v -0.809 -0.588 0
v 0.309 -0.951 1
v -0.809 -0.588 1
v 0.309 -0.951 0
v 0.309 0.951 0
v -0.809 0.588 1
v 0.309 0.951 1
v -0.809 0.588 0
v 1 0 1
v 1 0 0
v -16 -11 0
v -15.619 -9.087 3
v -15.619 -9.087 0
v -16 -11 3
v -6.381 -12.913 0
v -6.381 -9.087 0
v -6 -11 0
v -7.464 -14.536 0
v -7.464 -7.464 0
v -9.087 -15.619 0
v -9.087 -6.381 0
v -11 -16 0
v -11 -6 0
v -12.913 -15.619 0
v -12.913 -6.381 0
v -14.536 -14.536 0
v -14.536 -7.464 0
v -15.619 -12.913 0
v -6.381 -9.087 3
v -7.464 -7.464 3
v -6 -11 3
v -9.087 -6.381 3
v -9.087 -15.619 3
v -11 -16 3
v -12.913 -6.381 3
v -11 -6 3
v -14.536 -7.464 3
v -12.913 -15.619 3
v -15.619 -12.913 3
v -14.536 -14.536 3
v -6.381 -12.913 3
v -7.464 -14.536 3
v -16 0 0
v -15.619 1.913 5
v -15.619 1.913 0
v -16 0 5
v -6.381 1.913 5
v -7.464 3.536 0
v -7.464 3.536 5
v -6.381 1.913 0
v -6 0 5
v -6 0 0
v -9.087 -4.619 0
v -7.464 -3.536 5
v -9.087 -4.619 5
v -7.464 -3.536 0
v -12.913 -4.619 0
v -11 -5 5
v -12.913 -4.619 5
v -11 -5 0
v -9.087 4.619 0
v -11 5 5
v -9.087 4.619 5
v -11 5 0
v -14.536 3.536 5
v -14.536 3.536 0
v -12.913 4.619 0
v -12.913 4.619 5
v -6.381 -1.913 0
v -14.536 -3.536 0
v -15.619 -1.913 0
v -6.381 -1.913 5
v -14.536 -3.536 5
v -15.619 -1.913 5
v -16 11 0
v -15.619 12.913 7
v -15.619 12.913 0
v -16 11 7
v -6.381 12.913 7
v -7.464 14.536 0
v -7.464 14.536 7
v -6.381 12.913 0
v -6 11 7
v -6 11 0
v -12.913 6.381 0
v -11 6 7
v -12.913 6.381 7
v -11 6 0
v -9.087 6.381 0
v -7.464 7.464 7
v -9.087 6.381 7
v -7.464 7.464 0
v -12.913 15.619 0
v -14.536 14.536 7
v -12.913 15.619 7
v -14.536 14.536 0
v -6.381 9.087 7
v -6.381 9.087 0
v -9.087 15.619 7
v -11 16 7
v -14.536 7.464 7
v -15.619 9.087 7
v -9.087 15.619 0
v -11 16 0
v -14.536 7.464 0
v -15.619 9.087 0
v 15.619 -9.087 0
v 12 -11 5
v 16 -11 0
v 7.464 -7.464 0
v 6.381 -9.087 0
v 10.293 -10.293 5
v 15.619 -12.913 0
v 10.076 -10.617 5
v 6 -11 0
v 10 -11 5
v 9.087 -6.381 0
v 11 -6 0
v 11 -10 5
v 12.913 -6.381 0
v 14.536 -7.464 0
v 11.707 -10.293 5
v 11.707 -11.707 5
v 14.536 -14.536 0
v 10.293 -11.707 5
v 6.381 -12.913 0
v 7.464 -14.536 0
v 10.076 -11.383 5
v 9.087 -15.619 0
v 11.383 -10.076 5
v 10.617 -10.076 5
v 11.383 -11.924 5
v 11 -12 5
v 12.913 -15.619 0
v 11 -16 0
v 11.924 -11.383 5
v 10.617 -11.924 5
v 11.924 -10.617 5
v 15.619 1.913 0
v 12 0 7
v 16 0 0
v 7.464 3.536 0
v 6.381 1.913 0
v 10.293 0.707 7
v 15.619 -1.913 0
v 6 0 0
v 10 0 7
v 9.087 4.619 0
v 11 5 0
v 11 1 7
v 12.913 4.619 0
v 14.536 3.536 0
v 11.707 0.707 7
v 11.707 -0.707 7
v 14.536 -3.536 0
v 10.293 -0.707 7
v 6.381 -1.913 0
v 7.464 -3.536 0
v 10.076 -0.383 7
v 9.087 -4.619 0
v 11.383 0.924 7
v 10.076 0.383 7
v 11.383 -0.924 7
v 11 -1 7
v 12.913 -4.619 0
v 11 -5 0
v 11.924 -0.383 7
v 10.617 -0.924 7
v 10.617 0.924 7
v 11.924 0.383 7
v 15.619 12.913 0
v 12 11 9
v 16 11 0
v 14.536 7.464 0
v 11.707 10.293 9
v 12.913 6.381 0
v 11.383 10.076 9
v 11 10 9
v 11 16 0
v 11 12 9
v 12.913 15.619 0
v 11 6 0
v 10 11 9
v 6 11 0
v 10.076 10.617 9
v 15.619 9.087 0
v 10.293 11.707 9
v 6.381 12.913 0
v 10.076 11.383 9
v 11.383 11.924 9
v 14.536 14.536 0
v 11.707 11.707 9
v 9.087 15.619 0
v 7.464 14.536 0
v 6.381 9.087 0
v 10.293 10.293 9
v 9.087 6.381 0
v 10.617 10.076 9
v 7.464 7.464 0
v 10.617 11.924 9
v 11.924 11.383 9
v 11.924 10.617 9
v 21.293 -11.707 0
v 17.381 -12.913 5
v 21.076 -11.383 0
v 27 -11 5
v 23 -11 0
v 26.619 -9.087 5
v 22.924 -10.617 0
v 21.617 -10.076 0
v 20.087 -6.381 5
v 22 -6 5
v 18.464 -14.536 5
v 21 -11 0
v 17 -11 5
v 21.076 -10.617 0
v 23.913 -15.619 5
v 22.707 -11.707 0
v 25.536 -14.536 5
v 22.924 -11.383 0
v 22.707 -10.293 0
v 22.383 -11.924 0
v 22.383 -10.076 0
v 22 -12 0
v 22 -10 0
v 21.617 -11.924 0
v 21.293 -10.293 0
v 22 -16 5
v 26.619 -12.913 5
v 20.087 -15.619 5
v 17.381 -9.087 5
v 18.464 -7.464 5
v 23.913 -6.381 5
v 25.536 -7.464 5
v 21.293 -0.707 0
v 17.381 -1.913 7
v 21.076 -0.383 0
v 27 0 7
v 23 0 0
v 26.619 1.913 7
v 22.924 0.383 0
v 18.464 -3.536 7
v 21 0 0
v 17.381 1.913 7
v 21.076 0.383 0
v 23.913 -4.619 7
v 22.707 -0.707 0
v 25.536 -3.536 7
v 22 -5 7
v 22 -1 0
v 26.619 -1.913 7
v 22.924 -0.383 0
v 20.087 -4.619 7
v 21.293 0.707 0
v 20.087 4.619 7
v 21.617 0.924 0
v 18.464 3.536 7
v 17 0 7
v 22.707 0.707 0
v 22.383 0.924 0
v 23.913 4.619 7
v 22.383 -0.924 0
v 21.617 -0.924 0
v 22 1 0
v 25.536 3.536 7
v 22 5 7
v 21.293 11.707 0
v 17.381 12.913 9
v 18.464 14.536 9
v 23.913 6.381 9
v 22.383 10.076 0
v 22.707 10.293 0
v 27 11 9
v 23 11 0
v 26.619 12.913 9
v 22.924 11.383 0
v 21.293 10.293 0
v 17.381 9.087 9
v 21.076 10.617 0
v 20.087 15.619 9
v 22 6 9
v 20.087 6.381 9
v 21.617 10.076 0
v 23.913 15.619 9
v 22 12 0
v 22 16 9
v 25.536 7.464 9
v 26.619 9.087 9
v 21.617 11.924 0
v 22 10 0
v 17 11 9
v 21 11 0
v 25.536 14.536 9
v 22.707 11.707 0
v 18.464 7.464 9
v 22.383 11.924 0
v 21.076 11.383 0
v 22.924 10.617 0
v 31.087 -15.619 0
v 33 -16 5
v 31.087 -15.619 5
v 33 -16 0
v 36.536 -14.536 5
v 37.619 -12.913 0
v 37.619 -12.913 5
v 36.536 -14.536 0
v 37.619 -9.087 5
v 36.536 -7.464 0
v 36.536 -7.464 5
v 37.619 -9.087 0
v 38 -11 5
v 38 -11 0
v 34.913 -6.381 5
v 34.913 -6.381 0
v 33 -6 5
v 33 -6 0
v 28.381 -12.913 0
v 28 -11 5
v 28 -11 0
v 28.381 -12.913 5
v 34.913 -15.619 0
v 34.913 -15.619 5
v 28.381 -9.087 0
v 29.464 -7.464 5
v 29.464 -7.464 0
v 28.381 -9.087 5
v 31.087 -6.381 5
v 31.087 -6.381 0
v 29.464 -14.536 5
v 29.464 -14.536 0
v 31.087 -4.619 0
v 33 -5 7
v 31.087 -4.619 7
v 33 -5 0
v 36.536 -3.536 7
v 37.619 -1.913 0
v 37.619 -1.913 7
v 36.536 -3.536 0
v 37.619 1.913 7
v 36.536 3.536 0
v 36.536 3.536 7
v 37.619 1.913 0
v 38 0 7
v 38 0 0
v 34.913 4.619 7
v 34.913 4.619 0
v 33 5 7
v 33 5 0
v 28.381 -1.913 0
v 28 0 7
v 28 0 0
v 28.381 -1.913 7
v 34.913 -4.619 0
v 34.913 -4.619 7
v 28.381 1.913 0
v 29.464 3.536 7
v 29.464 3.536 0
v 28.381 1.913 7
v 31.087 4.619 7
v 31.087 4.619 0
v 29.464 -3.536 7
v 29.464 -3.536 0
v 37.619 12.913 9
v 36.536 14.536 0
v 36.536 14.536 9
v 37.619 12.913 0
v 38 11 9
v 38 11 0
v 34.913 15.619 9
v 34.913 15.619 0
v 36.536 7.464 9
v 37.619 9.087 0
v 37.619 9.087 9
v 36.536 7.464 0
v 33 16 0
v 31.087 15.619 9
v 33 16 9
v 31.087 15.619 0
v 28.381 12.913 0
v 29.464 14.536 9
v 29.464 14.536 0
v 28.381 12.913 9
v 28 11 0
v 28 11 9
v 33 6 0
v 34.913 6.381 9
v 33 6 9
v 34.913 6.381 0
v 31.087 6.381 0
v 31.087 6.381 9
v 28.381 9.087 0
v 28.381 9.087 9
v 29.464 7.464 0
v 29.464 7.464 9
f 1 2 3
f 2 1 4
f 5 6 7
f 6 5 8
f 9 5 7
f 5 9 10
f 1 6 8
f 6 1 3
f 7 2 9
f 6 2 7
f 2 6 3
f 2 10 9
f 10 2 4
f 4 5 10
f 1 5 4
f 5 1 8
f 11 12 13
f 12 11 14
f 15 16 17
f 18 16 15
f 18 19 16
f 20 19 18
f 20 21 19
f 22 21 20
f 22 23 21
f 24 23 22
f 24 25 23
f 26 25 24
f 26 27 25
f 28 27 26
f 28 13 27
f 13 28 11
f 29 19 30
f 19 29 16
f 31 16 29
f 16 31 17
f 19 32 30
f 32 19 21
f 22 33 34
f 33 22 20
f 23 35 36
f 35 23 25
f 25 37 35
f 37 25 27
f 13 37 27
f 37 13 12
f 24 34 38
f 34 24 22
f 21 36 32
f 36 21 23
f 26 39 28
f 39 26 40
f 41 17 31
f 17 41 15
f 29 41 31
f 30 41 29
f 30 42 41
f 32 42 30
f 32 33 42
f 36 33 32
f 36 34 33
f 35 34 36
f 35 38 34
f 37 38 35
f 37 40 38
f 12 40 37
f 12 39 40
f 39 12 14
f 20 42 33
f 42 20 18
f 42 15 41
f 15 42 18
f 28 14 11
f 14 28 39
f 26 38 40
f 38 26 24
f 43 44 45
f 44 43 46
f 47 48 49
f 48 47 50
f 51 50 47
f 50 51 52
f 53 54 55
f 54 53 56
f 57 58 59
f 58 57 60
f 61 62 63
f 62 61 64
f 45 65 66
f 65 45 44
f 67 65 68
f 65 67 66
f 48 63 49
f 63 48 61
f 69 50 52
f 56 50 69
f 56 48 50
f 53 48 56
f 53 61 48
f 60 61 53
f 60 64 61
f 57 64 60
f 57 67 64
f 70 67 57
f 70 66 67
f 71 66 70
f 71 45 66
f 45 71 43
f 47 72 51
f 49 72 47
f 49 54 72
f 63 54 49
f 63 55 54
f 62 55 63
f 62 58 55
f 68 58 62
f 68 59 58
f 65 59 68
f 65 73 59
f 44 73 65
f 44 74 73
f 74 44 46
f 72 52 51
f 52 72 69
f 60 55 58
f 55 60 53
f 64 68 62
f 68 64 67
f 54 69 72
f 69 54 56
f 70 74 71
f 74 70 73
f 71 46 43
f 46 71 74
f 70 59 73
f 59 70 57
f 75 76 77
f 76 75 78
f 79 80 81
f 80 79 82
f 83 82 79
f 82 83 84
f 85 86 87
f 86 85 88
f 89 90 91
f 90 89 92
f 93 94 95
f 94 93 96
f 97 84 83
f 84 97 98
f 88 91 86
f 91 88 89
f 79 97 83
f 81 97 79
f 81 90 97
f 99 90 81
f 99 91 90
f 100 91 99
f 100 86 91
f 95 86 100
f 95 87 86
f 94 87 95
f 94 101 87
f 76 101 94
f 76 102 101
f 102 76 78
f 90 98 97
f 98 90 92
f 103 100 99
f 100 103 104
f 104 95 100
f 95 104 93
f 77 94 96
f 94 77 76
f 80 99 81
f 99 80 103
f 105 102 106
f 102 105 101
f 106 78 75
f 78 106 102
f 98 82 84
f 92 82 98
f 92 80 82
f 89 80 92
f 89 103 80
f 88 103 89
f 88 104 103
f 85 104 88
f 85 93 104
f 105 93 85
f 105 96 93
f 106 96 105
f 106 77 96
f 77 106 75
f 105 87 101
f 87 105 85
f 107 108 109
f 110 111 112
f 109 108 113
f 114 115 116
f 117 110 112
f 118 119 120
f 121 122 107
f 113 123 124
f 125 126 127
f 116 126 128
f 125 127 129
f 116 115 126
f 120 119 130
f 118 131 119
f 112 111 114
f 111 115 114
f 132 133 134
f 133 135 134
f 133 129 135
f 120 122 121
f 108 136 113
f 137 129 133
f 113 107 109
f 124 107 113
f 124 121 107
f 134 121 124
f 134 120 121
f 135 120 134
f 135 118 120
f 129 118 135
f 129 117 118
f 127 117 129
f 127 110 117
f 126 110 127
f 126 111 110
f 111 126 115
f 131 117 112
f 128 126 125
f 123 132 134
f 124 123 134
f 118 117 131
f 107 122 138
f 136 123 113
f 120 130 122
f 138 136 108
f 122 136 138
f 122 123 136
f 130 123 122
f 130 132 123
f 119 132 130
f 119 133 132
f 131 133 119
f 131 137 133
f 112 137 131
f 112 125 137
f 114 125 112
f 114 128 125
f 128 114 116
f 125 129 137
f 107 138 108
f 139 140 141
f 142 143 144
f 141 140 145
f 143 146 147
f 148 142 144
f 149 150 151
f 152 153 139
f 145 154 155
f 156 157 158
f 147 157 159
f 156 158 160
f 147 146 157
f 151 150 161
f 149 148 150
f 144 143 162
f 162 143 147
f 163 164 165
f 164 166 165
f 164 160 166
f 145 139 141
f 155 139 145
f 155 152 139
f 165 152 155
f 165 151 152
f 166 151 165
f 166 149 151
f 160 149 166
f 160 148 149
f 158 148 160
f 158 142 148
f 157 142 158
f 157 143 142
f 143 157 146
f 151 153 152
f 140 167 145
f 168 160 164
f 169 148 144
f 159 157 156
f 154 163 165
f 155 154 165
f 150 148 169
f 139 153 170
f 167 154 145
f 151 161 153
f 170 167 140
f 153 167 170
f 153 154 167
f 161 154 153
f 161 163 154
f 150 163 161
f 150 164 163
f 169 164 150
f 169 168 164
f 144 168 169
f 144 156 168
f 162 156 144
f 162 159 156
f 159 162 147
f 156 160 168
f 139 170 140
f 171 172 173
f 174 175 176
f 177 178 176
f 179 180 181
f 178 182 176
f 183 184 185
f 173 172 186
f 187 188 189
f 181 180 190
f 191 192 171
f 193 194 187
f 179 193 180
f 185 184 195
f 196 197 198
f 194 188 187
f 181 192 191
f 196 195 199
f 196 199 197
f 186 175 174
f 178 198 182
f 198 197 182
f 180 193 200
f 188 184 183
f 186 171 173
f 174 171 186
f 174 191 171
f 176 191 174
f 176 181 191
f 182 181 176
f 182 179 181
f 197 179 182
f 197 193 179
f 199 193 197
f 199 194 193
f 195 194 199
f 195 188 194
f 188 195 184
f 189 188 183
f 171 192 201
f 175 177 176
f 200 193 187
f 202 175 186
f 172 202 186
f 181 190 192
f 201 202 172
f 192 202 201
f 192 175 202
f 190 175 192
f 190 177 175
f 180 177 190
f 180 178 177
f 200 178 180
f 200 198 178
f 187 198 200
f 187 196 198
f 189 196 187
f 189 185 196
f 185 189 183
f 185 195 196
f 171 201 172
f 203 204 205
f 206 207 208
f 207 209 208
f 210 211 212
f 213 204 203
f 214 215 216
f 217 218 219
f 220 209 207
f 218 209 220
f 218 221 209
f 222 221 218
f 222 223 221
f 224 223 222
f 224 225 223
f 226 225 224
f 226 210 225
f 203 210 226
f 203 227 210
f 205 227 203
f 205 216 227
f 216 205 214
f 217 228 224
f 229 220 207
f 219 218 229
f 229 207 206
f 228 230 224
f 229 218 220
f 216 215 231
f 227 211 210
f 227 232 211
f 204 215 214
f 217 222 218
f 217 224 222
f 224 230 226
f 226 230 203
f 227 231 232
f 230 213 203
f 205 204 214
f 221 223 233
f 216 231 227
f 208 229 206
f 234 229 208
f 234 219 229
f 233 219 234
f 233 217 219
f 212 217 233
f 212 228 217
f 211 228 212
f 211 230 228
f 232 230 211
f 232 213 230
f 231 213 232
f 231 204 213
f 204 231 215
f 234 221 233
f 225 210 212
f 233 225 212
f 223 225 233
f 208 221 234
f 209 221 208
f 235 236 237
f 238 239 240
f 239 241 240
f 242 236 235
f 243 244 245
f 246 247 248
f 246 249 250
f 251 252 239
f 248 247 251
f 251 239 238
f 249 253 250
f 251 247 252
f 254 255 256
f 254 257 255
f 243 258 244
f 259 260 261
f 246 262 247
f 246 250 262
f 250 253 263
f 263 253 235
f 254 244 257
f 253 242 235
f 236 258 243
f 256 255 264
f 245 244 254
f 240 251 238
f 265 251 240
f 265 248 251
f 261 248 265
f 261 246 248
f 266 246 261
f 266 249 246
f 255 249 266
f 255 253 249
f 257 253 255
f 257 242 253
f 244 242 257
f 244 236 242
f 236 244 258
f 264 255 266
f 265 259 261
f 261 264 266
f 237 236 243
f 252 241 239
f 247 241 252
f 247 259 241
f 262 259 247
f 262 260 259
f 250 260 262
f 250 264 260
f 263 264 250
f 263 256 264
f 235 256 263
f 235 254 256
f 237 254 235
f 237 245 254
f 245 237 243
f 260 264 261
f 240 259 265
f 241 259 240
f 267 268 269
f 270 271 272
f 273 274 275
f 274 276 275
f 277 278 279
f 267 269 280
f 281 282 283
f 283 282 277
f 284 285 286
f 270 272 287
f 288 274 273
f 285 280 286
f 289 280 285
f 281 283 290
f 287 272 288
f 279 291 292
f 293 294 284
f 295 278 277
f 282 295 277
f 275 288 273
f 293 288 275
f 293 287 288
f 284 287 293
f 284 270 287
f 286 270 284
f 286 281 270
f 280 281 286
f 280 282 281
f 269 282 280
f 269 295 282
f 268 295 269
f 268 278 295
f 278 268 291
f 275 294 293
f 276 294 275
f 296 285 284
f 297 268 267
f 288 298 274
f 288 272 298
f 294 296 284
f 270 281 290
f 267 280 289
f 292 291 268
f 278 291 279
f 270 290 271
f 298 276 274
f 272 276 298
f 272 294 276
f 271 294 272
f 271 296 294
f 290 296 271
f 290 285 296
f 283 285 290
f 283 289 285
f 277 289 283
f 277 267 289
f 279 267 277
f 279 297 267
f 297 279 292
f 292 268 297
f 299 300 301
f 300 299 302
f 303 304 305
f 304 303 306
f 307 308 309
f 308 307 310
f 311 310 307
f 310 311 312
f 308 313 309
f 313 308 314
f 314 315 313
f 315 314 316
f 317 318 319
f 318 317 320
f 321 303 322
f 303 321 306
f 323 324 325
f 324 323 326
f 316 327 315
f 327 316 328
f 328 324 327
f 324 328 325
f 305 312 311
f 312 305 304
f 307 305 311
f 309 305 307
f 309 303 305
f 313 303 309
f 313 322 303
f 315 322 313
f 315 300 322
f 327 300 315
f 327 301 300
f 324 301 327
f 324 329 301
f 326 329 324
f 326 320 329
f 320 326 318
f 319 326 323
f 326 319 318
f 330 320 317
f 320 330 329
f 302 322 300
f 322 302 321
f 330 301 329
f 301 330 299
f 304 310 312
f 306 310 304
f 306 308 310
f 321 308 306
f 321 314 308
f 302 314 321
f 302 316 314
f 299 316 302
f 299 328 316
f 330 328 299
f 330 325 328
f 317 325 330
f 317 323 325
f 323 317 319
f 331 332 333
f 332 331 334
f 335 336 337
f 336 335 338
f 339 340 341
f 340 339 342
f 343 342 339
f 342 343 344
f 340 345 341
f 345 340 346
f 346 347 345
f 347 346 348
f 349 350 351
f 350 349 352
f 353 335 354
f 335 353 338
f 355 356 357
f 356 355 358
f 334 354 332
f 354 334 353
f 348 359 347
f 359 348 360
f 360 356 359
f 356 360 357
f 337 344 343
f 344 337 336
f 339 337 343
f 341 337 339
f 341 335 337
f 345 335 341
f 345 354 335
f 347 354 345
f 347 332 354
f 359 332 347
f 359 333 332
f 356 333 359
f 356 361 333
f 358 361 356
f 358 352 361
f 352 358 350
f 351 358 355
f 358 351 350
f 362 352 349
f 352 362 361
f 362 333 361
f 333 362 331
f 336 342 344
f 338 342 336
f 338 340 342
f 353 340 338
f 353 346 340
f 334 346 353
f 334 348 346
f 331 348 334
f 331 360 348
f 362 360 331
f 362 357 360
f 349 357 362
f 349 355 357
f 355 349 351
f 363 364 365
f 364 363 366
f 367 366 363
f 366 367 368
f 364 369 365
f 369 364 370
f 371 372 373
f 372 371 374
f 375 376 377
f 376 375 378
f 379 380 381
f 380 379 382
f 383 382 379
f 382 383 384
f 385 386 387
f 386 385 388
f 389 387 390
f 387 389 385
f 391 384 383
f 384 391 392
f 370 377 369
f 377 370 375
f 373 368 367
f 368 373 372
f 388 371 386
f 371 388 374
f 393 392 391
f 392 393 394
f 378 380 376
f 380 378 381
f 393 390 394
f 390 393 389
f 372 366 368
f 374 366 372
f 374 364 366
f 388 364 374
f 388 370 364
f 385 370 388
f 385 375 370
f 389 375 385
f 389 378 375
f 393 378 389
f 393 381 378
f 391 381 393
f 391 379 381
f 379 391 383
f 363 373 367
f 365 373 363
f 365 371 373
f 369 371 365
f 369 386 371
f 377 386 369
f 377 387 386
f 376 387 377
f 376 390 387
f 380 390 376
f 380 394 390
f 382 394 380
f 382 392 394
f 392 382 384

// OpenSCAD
cylinder();
translate([-11,-11,0]) cylinder(h=3, r=5);
translate([-11,  0,0]) cylinder(h=5, d=10);
translate([-11, 11,0]) cylinder(h=7, r=1, d=10);
translate([ 11,-11,0]) cylinder(h=5, r1=5);
translate([ 11,  0,0]) cylinder(h=7, d1=10);
translate([ 11, 11,0]) cylinder(h=9, r1=1, d1=10);
translate([ 22,-11,0]) cylinder(h=5, r2=5);
translate([ 22,  0,0]) cylinder(h=7, d2=10);
translate([ 22, 11,0]) cylinder(h=9, r2=1, d2=10);
translate([ 33,-11,0]) cylinder(h=5, r1=5, r2=5);
translate([ 33,  0,0]) cylinder(h=7, d1=10, d2=10);
translate([ 33, 11,0]) cylinder(h=9, r1=1, d1=10, r2=1, d2=10);
